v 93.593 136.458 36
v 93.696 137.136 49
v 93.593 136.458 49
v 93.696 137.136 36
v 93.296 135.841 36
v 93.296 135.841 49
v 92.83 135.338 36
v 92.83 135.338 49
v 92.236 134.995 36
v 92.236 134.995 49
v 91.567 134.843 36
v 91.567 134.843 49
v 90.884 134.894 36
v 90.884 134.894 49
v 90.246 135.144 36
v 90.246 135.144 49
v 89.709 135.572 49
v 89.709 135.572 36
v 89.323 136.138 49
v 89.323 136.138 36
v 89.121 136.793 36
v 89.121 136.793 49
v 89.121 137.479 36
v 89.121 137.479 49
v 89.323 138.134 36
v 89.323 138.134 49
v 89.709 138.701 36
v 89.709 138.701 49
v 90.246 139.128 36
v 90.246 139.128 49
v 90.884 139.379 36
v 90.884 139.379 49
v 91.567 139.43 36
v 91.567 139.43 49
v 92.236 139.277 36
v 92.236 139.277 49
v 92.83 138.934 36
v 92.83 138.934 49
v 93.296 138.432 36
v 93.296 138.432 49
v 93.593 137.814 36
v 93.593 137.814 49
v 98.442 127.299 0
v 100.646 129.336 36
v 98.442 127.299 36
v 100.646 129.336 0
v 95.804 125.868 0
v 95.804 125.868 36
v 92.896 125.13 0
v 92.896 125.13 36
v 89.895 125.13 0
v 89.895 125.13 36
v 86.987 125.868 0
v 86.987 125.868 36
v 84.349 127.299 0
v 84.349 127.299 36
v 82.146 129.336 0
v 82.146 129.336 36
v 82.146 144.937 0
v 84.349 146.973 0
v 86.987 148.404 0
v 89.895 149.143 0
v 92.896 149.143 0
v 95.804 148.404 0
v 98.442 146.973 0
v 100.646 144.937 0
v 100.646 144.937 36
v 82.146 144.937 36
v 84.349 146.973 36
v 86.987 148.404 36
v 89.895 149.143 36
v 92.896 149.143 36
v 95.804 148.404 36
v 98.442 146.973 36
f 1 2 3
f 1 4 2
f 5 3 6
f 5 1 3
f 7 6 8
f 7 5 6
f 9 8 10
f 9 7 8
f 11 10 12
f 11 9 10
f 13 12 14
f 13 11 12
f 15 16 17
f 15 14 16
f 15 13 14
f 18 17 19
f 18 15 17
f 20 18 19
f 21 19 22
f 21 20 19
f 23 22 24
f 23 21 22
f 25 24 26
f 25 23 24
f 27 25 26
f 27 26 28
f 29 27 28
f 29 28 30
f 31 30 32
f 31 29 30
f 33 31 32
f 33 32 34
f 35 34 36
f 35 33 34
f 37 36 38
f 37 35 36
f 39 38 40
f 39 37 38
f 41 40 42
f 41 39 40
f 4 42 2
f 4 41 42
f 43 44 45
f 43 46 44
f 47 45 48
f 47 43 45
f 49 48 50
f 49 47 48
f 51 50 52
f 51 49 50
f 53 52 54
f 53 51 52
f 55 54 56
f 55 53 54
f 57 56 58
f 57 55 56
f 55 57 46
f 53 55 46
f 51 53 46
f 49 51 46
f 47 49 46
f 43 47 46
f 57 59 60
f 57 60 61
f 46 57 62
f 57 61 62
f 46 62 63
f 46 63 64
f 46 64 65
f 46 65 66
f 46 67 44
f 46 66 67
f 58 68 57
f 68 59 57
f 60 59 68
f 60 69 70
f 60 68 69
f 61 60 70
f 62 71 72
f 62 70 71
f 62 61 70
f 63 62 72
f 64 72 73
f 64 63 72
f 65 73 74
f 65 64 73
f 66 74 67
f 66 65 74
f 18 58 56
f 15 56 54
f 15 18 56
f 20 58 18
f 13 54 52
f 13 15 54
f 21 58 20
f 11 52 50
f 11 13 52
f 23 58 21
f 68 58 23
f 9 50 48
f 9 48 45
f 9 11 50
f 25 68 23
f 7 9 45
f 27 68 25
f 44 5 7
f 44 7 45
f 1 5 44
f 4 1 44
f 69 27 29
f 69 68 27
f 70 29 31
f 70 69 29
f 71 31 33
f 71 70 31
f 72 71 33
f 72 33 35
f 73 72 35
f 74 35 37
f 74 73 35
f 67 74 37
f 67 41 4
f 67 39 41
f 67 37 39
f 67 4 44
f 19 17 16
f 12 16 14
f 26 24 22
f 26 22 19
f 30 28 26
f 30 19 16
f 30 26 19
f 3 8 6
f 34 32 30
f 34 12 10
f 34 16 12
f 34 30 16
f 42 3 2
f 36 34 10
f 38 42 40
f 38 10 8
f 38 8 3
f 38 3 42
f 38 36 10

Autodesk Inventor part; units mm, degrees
ref_plane "YZ Plane" through (0, 0, 0) normal (1, 0, 0) x (0, 1, 0)
ref_plane "XZ Plane" through (0, 0, 0) normal (0, 1, 0) x (-1, 0, 0)
ref_plane "XY Plane" through (0, 0, 0) normal (0, 0, 1) x (1, 0, 0)
sketch "Sketch1" plane through (0, 0, 0) normal (0, 0, 1) x (1, 0, 0)
  line L0 (91.3955, 137.1362) -> (100.6455, 137.1362) construction
  line L1 (100.6455, 137.1362) -> (100.6455, 129.3358)
  line L2 (100.6455, 137.1362) -> (100.6455, 144.9367)
  line L3 (91.3955, 137.1362) -> (91.3955, 122.6202) construction
  line L4 (82.1455, 137.1362) -> (82.1455, 129.3358)
  line L5 (82.1455, 137.1362) -> (82.1455, 144.9367)
  arc A0 (100.6455, 144.9367) -> (82.1455, 144.9367) centre (91.3955, 137.1362) ccw
  arc A1 (82.1455, 129.3358) -> (100.6455, 129.3358) centre (91.3955, 137.1362) ccw
  point P0 (0, 0)
  point P1 (100.6455, 120.0736)
  point P2 (100.6455, 151.3606)
  point P3 (82.1455, 120.0736)
  point P4 (82.1455, 151.3606)
  dimension "d1" = 9.25
extrude "Extrusion1" add sketch "Sketch1" along normal blind 36
sketch "Sketch2" plane through (0, 0, 36) normal (0, 0, 1) x (1, 0, 0)
  arc A0 (100.6455, 144.9367) -> (82.1455, 144.9367) centre (91.3955, 137.1362) ccw projected
  circle A1 centre (91.3955, 137.1362) radius 2.3
  point P0 (0, 0)
  dimension "d4" = 4.6
extrude "Extrusion2" add sketch "Sketch2" along normal blind 13
properties part number "motor_12v"
